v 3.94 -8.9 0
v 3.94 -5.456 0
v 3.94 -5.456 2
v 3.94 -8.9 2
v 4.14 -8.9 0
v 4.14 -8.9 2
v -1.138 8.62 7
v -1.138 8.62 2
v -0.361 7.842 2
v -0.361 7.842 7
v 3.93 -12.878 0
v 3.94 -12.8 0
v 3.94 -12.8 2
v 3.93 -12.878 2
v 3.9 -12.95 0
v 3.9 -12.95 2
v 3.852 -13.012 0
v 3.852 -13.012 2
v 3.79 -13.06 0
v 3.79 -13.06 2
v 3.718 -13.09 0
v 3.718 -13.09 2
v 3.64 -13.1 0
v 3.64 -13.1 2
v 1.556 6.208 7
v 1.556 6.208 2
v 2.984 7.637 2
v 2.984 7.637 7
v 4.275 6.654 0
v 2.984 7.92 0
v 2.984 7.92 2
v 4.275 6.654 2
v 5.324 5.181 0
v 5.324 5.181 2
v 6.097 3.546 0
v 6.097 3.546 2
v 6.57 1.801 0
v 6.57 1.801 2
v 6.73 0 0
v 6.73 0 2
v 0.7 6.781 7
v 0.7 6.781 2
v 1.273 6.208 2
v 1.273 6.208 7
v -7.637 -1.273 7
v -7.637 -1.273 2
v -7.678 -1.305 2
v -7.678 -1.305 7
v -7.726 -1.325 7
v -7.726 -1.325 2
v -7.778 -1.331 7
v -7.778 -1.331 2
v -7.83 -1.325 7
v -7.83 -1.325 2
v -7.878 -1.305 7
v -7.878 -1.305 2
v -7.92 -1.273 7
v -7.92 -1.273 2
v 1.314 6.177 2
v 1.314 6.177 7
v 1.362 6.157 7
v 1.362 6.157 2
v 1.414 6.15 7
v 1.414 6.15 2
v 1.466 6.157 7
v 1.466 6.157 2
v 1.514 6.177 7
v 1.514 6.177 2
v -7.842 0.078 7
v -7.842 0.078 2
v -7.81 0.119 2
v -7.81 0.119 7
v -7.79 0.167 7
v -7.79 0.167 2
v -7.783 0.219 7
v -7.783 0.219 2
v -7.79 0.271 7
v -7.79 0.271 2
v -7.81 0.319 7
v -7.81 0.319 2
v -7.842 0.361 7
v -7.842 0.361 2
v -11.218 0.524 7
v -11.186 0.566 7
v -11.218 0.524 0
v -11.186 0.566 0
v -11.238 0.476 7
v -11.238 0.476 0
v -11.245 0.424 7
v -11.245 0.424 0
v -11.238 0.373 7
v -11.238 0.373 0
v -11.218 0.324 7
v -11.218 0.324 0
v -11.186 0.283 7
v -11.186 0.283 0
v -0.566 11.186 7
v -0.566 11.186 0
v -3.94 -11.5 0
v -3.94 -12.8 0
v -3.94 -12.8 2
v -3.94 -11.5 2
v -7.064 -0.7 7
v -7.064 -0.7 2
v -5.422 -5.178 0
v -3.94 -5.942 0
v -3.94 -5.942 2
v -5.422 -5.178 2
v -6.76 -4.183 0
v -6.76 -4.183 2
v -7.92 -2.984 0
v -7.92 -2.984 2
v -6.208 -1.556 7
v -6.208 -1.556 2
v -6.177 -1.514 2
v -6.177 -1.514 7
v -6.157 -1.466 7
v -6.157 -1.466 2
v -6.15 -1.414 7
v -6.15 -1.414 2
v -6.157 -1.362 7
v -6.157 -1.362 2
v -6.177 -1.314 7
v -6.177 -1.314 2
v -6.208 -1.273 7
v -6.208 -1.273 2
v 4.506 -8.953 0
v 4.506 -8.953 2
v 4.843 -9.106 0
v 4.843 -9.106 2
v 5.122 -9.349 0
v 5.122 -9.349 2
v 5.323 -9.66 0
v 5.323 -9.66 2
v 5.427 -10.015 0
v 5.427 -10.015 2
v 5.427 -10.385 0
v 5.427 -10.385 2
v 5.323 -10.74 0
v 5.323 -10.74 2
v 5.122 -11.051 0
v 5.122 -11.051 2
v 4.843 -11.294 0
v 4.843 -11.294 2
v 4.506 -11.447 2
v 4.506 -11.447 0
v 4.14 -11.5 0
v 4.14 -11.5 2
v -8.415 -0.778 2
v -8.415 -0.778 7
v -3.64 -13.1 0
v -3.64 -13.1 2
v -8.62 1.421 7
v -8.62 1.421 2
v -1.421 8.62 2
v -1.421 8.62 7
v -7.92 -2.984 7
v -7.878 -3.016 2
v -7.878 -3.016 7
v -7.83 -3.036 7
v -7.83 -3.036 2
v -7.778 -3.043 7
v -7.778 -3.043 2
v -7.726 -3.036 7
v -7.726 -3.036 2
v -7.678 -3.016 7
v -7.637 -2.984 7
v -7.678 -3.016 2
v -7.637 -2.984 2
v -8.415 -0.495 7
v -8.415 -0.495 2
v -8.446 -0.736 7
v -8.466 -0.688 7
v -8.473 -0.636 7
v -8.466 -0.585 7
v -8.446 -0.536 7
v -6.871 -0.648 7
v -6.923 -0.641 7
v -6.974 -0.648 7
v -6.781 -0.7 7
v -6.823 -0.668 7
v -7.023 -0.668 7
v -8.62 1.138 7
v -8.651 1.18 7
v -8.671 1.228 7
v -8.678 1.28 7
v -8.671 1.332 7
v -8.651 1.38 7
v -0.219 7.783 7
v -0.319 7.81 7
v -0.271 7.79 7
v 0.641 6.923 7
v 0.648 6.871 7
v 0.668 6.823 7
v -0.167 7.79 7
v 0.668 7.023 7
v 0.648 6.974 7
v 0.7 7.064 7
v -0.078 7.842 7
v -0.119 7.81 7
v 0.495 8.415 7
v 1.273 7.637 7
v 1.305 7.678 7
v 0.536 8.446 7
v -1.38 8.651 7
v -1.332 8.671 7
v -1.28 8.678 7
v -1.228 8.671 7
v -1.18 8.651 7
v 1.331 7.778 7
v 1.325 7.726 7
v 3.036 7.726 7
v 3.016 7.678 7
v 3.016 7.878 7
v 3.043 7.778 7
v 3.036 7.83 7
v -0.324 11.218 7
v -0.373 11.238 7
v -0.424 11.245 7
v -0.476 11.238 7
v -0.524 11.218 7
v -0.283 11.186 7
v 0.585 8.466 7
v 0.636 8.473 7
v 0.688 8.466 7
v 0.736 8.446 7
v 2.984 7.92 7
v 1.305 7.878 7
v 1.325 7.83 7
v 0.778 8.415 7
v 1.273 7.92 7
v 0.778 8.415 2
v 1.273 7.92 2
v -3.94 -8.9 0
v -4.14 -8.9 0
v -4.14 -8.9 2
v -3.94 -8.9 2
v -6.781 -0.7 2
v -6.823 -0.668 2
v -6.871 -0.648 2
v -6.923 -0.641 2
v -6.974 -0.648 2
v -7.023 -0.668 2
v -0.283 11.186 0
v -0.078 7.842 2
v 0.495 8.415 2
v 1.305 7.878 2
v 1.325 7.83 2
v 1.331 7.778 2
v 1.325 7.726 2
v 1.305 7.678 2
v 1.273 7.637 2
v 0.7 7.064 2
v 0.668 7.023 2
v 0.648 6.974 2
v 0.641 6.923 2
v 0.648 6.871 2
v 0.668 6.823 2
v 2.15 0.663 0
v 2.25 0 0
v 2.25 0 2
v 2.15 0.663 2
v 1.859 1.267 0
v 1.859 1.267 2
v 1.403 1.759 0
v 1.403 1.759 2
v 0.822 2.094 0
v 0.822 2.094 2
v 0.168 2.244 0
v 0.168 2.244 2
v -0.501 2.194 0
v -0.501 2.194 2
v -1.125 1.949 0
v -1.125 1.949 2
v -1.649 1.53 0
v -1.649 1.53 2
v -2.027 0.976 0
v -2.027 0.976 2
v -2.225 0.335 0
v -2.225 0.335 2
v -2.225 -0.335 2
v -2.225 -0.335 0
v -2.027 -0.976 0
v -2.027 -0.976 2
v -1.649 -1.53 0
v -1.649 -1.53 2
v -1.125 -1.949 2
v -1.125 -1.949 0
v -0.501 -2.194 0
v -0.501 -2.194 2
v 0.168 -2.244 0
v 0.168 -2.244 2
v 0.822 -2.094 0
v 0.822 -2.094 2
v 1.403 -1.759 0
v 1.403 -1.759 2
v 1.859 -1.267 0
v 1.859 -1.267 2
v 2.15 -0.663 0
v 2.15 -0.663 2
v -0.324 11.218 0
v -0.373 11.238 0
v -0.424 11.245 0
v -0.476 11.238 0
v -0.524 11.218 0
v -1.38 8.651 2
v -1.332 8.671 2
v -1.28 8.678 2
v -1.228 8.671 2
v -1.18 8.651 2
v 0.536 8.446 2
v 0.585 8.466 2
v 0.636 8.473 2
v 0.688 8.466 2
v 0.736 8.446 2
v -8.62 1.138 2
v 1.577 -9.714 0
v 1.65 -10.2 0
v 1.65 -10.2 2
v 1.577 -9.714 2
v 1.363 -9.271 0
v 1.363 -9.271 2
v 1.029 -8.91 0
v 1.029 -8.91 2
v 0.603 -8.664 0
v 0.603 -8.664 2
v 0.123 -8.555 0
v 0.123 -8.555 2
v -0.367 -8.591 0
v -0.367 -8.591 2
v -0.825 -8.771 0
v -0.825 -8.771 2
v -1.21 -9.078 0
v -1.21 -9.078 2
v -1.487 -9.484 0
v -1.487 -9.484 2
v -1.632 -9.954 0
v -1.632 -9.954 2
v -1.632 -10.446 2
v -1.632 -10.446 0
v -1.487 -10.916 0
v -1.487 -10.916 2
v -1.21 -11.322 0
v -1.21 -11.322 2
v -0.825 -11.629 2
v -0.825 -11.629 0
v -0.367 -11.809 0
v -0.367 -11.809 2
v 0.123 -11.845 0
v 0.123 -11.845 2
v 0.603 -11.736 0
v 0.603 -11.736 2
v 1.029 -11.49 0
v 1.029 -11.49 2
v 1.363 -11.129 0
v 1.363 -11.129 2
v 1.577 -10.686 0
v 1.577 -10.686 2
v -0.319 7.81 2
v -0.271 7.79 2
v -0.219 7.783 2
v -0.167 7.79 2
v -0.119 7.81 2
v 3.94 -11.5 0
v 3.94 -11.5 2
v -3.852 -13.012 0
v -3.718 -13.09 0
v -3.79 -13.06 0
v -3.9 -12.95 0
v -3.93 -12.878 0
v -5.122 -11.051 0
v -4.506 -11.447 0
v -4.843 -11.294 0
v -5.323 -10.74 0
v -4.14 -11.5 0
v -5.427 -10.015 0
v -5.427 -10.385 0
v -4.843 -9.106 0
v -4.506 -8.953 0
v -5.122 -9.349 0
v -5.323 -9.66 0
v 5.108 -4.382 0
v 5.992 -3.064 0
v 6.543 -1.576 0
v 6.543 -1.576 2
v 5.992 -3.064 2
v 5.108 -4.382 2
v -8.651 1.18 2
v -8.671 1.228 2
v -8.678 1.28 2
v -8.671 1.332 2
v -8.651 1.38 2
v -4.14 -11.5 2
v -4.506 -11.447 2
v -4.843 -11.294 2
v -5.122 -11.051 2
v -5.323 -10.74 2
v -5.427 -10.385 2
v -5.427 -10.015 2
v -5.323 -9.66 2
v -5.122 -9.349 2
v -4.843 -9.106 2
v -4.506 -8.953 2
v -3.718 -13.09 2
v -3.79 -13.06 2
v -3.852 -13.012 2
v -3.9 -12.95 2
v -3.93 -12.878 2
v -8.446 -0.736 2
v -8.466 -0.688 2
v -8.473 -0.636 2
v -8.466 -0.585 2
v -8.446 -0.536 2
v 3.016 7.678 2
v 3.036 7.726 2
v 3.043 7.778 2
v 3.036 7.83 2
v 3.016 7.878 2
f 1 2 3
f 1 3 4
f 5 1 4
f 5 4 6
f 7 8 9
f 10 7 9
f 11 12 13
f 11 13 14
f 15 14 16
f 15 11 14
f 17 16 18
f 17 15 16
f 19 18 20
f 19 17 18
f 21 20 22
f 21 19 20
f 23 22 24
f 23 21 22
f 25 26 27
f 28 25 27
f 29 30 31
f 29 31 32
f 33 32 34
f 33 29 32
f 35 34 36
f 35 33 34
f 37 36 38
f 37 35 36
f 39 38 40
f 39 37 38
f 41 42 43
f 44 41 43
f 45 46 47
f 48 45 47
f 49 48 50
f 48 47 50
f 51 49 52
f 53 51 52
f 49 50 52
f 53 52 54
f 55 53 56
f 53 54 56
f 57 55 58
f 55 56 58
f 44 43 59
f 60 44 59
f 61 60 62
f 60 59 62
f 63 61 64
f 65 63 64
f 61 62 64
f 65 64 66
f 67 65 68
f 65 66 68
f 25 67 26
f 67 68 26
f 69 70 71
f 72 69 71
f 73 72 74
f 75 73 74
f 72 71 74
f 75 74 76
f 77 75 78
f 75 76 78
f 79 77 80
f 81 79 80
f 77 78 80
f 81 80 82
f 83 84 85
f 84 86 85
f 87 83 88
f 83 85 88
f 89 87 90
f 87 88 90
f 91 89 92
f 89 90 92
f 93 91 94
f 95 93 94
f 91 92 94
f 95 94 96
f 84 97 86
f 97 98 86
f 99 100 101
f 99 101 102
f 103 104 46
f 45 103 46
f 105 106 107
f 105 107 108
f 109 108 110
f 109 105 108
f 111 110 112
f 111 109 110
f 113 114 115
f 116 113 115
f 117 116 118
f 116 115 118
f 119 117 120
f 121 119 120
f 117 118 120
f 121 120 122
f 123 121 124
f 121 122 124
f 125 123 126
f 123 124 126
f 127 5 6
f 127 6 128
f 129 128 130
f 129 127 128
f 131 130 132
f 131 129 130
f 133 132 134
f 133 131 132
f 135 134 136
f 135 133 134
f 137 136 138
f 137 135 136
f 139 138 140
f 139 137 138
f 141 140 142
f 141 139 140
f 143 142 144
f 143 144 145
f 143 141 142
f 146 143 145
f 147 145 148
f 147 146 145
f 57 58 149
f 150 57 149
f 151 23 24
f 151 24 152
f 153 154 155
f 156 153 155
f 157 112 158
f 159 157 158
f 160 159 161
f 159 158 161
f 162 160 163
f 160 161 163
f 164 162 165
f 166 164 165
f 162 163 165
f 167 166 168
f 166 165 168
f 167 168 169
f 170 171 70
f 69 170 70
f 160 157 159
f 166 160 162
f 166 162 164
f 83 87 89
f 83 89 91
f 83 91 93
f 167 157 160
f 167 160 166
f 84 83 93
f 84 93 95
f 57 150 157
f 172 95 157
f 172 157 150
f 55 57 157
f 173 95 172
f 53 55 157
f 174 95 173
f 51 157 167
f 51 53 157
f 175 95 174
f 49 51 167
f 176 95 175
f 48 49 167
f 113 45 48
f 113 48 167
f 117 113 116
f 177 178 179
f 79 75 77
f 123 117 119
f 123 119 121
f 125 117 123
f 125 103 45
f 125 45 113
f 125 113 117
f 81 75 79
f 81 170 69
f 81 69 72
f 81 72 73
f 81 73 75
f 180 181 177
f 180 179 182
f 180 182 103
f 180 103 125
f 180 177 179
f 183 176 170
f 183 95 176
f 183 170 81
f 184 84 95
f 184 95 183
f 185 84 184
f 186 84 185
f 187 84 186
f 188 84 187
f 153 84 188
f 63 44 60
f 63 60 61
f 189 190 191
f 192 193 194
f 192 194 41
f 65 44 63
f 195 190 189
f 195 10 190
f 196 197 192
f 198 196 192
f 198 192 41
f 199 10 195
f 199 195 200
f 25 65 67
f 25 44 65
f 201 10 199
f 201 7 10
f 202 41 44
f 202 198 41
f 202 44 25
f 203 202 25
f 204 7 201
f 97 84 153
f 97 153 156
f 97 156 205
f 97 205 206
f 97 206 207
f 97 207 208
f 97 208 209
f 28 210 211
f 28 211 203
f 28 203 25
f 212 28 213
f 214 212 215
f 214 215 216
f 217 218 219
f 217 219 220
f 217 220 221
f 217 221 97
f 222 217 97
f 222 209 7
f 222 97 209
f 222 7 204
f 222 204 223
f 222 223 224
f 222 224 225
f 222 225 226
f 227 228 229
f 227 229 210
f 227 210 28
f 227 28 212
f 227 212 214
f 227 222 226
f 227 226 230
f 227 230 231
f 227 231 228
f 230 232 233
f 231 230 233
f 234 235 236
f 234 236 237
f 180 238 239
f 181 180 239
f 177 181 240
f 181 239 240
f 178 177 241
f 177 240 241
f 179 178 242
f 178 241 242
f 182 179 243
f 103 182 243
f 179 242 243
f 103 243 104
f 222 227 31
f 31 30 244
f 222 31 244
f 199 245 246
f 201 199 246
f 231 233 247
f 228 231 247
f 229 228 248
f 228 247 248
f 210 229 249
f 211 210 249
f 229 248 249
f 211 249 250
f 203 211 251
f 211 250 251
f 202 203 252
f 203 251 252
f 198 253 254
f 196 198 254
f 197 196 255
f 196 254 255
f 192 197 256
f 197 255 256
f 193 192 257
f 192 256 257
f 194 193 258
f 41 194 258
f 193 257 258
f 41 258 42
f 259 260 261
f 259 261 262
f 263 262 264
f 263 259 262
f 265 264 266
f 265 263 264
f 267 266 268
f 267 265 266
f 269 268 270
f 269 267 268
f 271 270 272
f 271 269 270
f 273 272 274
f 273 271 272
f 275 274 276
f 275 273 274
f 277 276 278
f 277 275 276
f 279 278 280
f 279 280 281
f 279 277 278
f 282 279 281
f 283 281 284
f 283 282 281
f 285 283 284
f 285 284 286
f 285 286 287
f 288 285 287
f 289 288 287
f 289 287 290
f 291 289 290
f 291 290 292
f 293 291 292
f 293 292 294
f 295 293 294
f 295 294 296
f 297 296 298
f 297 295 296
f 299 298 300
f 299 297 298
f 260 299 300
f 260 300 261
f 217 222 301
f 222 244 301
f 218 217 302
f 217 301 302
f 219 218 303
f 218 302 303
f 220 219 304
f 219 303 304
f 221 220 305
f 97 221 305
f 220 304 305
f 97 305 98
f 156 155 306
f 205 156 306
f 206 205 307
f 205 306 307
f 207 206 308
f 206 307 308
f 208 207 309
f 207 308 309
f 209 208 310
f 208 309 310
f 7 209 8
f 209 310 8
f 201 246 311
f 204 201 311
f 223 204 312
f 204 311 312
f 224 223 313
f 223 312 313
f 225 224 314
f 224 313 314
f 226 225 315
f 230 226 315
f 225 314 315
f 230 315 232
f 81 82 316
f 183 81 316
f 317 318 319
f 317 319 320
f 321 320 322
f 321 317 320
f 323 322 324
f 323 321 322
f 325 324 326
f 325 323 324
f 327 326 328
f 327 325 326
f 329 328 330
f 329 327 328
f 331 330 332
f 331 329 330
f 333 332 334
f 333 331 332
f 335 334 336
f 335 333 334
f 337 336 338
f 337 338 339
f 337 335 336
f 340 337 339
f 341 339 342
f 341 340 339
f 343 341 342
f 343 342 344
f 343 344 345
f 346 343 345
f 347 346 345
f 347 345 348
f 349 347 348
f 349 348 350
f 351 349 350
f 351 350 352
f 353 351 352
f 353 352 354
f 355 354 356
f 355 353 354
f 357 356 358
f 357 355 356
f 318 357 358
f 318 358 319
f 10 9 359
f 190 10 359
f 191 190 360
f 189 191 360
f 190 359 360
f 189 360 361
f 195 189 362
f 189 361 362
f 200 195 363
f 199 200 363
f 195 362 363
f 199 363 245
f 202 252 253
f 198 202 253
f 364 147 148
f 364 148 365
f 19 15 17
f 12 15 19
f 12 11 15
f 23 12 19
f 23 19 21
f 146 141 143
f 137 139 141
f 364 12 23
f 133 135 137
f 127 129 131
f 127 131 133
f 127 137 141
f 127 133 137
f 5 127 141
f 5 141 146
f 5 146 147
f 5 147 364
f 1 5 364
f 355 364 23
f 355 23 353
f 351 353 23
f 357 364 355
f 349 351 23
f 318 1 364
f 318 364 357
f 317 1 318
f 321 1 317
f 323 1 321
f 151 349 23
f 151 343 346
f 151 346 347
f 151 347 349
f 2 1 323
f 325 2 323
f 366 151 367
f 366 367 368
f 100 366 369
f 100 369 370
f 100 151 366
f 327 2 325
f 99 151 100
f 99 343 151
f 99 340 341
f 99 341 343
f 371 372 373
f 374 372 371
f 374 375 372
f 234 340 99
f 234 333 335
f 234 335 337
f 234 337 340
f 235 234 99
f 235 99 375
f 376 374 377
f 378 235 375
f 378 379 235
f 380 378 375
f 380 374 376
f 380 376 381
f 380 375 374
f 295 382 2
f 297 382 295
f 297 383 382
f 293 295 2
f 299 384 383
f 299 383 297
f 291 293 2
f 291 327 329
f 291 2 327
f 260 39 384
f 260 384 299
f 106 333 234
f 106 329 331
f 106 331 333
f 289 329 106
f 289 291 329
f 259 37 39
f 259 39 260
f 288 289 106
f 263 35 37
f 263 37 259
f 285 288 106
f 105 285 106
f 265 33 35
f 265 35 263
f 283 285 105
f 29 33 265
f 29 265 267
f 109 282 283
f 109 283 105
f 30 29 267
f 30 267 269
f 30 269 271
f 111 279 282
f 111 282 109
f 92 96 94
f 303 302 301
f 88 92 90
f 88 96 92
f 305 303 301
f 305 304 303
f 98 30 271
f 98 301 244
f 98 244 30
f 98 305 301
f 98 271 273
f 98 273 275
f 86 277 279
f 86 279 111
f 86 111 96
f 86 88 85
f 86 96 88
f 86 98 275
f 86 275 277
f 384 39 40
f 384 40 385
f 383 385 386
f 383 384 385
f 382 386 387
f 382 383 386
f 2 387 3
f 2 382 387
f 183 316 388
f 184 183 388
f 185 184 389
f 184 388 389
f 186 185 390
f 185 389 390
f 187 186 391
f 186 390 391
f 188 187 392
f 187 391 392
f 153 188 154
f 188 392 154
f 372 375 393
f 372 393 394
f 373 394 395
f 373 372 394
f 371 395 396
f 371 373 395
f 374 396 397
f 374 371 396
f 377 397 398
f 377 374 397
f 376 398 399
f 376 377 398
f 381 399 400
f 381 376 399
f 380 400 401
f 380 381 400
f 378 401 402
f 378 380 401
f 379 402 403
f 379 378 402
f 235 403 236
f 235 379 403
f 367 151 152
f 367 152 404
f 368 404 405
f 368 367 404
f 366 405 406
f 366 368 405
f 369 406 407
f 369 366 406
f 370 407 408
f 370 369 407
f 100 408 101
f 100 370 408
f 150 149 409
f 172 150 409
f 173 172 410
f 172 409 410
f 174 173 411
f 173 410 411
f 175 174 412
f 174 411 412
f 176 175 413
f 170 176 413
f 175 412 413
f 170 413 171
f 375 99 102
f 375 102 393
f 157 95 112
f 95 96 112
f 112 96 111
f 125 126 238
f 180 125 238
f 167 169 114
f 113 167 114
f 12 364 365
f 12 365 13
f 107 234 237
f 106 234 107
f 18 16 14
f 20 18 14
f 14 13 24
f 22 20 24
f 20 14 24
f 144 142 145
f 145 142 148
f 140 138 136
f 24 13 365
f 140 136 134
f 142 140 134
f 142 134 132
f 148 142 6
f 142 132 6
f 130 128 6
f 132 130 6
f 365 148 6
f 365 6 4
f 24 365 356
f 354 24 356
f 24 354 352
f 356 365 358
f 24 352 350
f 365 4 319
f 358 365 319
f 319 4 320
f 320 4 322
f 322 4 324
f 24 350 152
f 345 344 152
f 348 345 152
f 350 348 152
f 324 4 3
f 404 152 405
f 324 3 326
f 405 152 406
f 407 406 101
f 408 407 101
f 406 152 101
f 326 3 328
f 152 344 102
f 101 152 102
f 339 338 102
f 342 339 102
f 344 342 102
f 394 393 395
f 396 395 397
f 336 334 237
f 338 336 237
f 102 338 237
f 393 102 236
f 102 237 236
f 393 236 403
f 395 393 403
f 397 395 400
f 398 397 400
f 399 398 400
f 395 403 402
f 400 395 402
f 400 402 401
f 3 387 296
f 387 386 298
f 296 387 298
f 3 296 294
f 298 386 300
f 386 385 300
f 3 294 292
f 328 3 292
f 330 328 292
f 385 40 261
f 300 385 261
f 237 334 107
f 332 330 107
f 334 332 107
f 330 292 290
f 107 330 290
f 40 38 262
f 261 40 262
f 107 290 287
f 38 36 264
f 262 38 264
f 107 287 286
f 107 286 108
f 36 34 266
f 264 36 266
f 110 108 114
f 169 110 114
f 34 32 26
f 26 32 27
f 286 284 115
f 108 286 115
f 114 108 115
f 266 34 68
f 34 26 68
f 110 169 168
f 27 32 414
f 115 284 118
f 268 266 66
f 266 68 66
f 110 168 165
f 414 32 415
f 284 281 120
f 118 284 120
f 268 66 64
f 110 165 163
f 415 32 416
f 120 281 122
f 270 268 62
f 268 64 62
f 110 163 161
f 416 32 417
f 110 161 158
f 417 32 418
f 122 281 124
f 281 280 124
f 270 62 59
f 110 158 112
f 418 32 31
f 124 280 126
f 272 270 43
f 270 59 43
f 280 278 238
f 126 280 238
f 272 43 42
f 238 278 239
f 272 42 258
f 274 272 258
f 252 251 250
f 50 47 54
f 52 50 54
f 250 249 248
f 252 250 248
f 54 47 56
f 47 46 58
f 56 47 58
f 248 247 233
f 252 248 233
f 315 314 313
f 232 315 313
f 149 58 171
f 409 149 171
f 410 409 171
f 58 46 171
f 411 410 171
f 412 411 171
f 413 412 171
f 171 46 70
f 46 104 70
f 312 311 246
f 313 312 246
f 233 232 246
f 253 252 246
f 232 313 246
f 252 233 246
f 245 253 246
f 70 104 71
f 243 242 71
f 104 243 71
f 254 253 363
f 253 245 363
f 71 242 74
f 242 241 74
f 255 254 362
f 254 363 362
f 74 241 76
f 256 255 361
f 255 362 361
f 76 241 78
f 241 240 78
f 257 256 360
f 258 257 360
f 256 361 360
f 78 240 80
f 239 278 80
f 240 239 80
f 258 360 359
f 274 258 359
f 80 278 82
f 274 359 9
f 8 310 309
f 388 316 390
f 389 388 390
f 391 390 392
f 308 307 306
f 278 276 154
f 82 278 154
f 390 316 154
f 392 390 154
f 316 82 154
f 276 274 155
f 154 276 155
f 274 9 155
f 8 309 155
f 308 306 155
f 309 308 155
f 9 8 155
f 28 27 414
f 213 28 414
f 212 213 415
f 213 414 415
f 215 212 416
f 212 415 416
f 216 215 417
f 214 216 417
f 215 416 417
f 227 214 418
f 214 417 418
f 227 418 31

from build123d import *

# Parameters (mm, degrees)
SKETCH1_R           = 2.25
SKETCH1_R_2         = 1.65
BOSS_EXTRUDE1_DEPTH = 2
BOSS_EXTRUDE2_DEPTH = 5


with BuildPart() as part:
    # Sketch1 → Boss-Extrude1 (new body)
    with BuildSketch(Plane.XY):
        with BuildLine():
            Line((-4.14, -8.9), (-3.94, -8.9))
            Line((-3.94, -8.9), (-3.94, -5.942048338))
            ThreePointArc((-3.94, -5.942048338), (-6.111467123, -4.707426407), (-7.919595949, -2.983990617))
            Line((-7.919595949, -2.983990617), (-11.186429278, 0.282842712))
            ThreePointArc((-11.186429278, 0.282842712), (-11.245007922, 0.424264069), (-11.186429278, 0.565685425))
            Line((-11.186429278, 0.565685425), (-0.565685425, 11.186429278))
            ThreePointArc((-0.565685425, 11.186429278), (-0.424264069, 11.245007922), (-0.282842712, 11.186429278))
            Line((-0.282842712, 11.186429278), (2.983990617, 7.919595949))
            ThreePointArc((2.983990617, 7.919595949), (5.746266235, 4.38042767), (6.73, 0))
            ThreePointArc((6.73, 0), (5.992040554, -3.064041449), (3.94, -5.456124999))
            Line((3.94, -5.456124999), (3.94, -8.9))
            Line((3.94, -8.9), (4.14, -8.9))
            ThreePointArc((4.14, -8.9), (5.44, -10.2), (4.14, -11.5))
            Line((4.14, -11.5), (3.94, -11.5))
            Line((3.94, -11.5), (3.94, -12.8))
            ThreePointArc((3.94, -12.8), (3.852132034, -13.012132034), (3.64, -13.1))
            Line((3.64, -13.1), (-3.64, -13.1))
            ThreePointArc((-3.64, -13.1), (-3.852132034, -13.012132034), (-3.94, -12.8))
            Line((-3.94, -12.8), (-3.94, -11.5))
            Line((-3.94, -11.5), (-4.14, -11.5))
            ThreePointArc((-4.14, -11.5), (-5.44, -10.2), (-4.14, -8.9))
        make_face()
        Circle(SKETCH1_R, mode=Mode.SUBTRACT)
        with Locations((0, -10.2)):
            Circle(SKETCH1_R_2, mode=Mode.SUBTRACT)
    extrude(amount=BOSS_EXTRUDE1_DEPTH)

    # Sketch2 → Boss-Extrude2 (add)
    with BuildSketch(Plane.XY.offset(2)):
        with BuildLine():
            Line((0.700035713, 6.781154032), (1.272792206, 6.208397539))
            ThreePointArc((1.272792206, 6.208397539), (1.414213562, 6.149818895), (1.555634919, 6.208397539))
            Line((1.555634919, 6.208397539), (2.983990617, 7.636753237))
            ThreePointArc((2.983990617, 7.636753237), (3.04256926, 7.778174593), (2.983990617, 7.919595949))
            Line((2.983990617, 7.919595949), (-0.282842712, 11.186429278))
            ThreePointArc((-0.282842712, 11.186429278), (-0.424264069, 11.245007922), (-0.565685425, 11.186429278))
            Line((-0.565685425, 11.186429278), (-11.186429278, 0.565685425))
            ThreePointArc((-11.186429278, 0.565685425), (-11.245007922, 0.424264069), (-11.186429278, 0.282842712))
            Line((-11.186429278, 0.282842712), (-7.919595949, -2.983990617))
            ThreePointArc((-7.919595949, -2.983990617), (-7.778174593, -3.04256926), (-7.636753237, -2.983990617))
            Line((-7.636753237, -2.983990617), (-6.208397539, -1.555634919))
            ThreePointArc((-6.208397539, -1.555634919), (-6.149818895, -1.414213562), (-6.208397539, -1.272792206))
            Line((-6.208397539, -1.272792206), (-6.781154032, -0.700035713))
            ThreePointArc((-6.781154032, -0.700035713), (-6.922575388, -0.64145707), (-7.063996744, -0.700035713))
            Line((-7.063996744, -0.700035713), (-7.636753237, -1.272792206))
            ThreePointArc((-7.636753237, -1.272792206), (-7.778174593, -1.33137085), (-7.919595949, -1.272792206))
            Line((-7.919595949, -1.272792206), (-8.414570696, -0.777817459))
            ThreePointArc((-8.414570696, -0.777817459), (-8.47314934, -0.636396103), (-8.414570696, -0.494974747))
            Line((-8.414570696, -0.494974747), (-7.841814203, 0.077781746))
            ThreePointArc((-7.841814203, 0.077781746), (-7.78323556, 0.219203102), (-7.841814203, 0.360624458))
            Line((-7.841814203, 0.360624458), (-8.619631663, 1.138441918))
            ThreePointArc((-8.619631663, 1.138441918), (-8.678210306, 1.279863274), (-8.619631663, 1.42128463))
            Line((-8.619631663, 1.42128463), (-1.42128463, 8.619631663))
            ThreePointArc((-1.42128463, 8.619631663), (-1.279863274, 8.678210306), (-1.138441918, 8.619631663))
            Line((-1.138441918, 8.619631663), (-0.360624458, 7.841814203))
            ThreePointArc((-0.360624458, 7.841814203), (-0.219203102, 7.78323556), (-0.077781746, 7.841814203))
            Line((-0.077781746, 7.841814203), (0.494974747, 8.414570696))
            ThreePointArc((0.494974747, 8.414570696), (0.636396103, 8.47314934), (0.777817459, 8.414570696))
            Line((0.777817459, 8.414570696), (1.272792206, 7.919595949))
            ThreePointArc((1.272792206, 7.919595949), (1.33137085, 7.778174593), (1.272792206, 7.636753237))
            Line((1.272792206, 7.636753237), (0.700035713, 7.063996744))
            ThreePointArc((0.700035713, 7.063996744), (0.64145707, 6.922575388), (0.700035713, 6.781154032))
        make_face()
    extrude(amount=BOSS_EXTRUDE2_DEPTH)


solid = part.part
